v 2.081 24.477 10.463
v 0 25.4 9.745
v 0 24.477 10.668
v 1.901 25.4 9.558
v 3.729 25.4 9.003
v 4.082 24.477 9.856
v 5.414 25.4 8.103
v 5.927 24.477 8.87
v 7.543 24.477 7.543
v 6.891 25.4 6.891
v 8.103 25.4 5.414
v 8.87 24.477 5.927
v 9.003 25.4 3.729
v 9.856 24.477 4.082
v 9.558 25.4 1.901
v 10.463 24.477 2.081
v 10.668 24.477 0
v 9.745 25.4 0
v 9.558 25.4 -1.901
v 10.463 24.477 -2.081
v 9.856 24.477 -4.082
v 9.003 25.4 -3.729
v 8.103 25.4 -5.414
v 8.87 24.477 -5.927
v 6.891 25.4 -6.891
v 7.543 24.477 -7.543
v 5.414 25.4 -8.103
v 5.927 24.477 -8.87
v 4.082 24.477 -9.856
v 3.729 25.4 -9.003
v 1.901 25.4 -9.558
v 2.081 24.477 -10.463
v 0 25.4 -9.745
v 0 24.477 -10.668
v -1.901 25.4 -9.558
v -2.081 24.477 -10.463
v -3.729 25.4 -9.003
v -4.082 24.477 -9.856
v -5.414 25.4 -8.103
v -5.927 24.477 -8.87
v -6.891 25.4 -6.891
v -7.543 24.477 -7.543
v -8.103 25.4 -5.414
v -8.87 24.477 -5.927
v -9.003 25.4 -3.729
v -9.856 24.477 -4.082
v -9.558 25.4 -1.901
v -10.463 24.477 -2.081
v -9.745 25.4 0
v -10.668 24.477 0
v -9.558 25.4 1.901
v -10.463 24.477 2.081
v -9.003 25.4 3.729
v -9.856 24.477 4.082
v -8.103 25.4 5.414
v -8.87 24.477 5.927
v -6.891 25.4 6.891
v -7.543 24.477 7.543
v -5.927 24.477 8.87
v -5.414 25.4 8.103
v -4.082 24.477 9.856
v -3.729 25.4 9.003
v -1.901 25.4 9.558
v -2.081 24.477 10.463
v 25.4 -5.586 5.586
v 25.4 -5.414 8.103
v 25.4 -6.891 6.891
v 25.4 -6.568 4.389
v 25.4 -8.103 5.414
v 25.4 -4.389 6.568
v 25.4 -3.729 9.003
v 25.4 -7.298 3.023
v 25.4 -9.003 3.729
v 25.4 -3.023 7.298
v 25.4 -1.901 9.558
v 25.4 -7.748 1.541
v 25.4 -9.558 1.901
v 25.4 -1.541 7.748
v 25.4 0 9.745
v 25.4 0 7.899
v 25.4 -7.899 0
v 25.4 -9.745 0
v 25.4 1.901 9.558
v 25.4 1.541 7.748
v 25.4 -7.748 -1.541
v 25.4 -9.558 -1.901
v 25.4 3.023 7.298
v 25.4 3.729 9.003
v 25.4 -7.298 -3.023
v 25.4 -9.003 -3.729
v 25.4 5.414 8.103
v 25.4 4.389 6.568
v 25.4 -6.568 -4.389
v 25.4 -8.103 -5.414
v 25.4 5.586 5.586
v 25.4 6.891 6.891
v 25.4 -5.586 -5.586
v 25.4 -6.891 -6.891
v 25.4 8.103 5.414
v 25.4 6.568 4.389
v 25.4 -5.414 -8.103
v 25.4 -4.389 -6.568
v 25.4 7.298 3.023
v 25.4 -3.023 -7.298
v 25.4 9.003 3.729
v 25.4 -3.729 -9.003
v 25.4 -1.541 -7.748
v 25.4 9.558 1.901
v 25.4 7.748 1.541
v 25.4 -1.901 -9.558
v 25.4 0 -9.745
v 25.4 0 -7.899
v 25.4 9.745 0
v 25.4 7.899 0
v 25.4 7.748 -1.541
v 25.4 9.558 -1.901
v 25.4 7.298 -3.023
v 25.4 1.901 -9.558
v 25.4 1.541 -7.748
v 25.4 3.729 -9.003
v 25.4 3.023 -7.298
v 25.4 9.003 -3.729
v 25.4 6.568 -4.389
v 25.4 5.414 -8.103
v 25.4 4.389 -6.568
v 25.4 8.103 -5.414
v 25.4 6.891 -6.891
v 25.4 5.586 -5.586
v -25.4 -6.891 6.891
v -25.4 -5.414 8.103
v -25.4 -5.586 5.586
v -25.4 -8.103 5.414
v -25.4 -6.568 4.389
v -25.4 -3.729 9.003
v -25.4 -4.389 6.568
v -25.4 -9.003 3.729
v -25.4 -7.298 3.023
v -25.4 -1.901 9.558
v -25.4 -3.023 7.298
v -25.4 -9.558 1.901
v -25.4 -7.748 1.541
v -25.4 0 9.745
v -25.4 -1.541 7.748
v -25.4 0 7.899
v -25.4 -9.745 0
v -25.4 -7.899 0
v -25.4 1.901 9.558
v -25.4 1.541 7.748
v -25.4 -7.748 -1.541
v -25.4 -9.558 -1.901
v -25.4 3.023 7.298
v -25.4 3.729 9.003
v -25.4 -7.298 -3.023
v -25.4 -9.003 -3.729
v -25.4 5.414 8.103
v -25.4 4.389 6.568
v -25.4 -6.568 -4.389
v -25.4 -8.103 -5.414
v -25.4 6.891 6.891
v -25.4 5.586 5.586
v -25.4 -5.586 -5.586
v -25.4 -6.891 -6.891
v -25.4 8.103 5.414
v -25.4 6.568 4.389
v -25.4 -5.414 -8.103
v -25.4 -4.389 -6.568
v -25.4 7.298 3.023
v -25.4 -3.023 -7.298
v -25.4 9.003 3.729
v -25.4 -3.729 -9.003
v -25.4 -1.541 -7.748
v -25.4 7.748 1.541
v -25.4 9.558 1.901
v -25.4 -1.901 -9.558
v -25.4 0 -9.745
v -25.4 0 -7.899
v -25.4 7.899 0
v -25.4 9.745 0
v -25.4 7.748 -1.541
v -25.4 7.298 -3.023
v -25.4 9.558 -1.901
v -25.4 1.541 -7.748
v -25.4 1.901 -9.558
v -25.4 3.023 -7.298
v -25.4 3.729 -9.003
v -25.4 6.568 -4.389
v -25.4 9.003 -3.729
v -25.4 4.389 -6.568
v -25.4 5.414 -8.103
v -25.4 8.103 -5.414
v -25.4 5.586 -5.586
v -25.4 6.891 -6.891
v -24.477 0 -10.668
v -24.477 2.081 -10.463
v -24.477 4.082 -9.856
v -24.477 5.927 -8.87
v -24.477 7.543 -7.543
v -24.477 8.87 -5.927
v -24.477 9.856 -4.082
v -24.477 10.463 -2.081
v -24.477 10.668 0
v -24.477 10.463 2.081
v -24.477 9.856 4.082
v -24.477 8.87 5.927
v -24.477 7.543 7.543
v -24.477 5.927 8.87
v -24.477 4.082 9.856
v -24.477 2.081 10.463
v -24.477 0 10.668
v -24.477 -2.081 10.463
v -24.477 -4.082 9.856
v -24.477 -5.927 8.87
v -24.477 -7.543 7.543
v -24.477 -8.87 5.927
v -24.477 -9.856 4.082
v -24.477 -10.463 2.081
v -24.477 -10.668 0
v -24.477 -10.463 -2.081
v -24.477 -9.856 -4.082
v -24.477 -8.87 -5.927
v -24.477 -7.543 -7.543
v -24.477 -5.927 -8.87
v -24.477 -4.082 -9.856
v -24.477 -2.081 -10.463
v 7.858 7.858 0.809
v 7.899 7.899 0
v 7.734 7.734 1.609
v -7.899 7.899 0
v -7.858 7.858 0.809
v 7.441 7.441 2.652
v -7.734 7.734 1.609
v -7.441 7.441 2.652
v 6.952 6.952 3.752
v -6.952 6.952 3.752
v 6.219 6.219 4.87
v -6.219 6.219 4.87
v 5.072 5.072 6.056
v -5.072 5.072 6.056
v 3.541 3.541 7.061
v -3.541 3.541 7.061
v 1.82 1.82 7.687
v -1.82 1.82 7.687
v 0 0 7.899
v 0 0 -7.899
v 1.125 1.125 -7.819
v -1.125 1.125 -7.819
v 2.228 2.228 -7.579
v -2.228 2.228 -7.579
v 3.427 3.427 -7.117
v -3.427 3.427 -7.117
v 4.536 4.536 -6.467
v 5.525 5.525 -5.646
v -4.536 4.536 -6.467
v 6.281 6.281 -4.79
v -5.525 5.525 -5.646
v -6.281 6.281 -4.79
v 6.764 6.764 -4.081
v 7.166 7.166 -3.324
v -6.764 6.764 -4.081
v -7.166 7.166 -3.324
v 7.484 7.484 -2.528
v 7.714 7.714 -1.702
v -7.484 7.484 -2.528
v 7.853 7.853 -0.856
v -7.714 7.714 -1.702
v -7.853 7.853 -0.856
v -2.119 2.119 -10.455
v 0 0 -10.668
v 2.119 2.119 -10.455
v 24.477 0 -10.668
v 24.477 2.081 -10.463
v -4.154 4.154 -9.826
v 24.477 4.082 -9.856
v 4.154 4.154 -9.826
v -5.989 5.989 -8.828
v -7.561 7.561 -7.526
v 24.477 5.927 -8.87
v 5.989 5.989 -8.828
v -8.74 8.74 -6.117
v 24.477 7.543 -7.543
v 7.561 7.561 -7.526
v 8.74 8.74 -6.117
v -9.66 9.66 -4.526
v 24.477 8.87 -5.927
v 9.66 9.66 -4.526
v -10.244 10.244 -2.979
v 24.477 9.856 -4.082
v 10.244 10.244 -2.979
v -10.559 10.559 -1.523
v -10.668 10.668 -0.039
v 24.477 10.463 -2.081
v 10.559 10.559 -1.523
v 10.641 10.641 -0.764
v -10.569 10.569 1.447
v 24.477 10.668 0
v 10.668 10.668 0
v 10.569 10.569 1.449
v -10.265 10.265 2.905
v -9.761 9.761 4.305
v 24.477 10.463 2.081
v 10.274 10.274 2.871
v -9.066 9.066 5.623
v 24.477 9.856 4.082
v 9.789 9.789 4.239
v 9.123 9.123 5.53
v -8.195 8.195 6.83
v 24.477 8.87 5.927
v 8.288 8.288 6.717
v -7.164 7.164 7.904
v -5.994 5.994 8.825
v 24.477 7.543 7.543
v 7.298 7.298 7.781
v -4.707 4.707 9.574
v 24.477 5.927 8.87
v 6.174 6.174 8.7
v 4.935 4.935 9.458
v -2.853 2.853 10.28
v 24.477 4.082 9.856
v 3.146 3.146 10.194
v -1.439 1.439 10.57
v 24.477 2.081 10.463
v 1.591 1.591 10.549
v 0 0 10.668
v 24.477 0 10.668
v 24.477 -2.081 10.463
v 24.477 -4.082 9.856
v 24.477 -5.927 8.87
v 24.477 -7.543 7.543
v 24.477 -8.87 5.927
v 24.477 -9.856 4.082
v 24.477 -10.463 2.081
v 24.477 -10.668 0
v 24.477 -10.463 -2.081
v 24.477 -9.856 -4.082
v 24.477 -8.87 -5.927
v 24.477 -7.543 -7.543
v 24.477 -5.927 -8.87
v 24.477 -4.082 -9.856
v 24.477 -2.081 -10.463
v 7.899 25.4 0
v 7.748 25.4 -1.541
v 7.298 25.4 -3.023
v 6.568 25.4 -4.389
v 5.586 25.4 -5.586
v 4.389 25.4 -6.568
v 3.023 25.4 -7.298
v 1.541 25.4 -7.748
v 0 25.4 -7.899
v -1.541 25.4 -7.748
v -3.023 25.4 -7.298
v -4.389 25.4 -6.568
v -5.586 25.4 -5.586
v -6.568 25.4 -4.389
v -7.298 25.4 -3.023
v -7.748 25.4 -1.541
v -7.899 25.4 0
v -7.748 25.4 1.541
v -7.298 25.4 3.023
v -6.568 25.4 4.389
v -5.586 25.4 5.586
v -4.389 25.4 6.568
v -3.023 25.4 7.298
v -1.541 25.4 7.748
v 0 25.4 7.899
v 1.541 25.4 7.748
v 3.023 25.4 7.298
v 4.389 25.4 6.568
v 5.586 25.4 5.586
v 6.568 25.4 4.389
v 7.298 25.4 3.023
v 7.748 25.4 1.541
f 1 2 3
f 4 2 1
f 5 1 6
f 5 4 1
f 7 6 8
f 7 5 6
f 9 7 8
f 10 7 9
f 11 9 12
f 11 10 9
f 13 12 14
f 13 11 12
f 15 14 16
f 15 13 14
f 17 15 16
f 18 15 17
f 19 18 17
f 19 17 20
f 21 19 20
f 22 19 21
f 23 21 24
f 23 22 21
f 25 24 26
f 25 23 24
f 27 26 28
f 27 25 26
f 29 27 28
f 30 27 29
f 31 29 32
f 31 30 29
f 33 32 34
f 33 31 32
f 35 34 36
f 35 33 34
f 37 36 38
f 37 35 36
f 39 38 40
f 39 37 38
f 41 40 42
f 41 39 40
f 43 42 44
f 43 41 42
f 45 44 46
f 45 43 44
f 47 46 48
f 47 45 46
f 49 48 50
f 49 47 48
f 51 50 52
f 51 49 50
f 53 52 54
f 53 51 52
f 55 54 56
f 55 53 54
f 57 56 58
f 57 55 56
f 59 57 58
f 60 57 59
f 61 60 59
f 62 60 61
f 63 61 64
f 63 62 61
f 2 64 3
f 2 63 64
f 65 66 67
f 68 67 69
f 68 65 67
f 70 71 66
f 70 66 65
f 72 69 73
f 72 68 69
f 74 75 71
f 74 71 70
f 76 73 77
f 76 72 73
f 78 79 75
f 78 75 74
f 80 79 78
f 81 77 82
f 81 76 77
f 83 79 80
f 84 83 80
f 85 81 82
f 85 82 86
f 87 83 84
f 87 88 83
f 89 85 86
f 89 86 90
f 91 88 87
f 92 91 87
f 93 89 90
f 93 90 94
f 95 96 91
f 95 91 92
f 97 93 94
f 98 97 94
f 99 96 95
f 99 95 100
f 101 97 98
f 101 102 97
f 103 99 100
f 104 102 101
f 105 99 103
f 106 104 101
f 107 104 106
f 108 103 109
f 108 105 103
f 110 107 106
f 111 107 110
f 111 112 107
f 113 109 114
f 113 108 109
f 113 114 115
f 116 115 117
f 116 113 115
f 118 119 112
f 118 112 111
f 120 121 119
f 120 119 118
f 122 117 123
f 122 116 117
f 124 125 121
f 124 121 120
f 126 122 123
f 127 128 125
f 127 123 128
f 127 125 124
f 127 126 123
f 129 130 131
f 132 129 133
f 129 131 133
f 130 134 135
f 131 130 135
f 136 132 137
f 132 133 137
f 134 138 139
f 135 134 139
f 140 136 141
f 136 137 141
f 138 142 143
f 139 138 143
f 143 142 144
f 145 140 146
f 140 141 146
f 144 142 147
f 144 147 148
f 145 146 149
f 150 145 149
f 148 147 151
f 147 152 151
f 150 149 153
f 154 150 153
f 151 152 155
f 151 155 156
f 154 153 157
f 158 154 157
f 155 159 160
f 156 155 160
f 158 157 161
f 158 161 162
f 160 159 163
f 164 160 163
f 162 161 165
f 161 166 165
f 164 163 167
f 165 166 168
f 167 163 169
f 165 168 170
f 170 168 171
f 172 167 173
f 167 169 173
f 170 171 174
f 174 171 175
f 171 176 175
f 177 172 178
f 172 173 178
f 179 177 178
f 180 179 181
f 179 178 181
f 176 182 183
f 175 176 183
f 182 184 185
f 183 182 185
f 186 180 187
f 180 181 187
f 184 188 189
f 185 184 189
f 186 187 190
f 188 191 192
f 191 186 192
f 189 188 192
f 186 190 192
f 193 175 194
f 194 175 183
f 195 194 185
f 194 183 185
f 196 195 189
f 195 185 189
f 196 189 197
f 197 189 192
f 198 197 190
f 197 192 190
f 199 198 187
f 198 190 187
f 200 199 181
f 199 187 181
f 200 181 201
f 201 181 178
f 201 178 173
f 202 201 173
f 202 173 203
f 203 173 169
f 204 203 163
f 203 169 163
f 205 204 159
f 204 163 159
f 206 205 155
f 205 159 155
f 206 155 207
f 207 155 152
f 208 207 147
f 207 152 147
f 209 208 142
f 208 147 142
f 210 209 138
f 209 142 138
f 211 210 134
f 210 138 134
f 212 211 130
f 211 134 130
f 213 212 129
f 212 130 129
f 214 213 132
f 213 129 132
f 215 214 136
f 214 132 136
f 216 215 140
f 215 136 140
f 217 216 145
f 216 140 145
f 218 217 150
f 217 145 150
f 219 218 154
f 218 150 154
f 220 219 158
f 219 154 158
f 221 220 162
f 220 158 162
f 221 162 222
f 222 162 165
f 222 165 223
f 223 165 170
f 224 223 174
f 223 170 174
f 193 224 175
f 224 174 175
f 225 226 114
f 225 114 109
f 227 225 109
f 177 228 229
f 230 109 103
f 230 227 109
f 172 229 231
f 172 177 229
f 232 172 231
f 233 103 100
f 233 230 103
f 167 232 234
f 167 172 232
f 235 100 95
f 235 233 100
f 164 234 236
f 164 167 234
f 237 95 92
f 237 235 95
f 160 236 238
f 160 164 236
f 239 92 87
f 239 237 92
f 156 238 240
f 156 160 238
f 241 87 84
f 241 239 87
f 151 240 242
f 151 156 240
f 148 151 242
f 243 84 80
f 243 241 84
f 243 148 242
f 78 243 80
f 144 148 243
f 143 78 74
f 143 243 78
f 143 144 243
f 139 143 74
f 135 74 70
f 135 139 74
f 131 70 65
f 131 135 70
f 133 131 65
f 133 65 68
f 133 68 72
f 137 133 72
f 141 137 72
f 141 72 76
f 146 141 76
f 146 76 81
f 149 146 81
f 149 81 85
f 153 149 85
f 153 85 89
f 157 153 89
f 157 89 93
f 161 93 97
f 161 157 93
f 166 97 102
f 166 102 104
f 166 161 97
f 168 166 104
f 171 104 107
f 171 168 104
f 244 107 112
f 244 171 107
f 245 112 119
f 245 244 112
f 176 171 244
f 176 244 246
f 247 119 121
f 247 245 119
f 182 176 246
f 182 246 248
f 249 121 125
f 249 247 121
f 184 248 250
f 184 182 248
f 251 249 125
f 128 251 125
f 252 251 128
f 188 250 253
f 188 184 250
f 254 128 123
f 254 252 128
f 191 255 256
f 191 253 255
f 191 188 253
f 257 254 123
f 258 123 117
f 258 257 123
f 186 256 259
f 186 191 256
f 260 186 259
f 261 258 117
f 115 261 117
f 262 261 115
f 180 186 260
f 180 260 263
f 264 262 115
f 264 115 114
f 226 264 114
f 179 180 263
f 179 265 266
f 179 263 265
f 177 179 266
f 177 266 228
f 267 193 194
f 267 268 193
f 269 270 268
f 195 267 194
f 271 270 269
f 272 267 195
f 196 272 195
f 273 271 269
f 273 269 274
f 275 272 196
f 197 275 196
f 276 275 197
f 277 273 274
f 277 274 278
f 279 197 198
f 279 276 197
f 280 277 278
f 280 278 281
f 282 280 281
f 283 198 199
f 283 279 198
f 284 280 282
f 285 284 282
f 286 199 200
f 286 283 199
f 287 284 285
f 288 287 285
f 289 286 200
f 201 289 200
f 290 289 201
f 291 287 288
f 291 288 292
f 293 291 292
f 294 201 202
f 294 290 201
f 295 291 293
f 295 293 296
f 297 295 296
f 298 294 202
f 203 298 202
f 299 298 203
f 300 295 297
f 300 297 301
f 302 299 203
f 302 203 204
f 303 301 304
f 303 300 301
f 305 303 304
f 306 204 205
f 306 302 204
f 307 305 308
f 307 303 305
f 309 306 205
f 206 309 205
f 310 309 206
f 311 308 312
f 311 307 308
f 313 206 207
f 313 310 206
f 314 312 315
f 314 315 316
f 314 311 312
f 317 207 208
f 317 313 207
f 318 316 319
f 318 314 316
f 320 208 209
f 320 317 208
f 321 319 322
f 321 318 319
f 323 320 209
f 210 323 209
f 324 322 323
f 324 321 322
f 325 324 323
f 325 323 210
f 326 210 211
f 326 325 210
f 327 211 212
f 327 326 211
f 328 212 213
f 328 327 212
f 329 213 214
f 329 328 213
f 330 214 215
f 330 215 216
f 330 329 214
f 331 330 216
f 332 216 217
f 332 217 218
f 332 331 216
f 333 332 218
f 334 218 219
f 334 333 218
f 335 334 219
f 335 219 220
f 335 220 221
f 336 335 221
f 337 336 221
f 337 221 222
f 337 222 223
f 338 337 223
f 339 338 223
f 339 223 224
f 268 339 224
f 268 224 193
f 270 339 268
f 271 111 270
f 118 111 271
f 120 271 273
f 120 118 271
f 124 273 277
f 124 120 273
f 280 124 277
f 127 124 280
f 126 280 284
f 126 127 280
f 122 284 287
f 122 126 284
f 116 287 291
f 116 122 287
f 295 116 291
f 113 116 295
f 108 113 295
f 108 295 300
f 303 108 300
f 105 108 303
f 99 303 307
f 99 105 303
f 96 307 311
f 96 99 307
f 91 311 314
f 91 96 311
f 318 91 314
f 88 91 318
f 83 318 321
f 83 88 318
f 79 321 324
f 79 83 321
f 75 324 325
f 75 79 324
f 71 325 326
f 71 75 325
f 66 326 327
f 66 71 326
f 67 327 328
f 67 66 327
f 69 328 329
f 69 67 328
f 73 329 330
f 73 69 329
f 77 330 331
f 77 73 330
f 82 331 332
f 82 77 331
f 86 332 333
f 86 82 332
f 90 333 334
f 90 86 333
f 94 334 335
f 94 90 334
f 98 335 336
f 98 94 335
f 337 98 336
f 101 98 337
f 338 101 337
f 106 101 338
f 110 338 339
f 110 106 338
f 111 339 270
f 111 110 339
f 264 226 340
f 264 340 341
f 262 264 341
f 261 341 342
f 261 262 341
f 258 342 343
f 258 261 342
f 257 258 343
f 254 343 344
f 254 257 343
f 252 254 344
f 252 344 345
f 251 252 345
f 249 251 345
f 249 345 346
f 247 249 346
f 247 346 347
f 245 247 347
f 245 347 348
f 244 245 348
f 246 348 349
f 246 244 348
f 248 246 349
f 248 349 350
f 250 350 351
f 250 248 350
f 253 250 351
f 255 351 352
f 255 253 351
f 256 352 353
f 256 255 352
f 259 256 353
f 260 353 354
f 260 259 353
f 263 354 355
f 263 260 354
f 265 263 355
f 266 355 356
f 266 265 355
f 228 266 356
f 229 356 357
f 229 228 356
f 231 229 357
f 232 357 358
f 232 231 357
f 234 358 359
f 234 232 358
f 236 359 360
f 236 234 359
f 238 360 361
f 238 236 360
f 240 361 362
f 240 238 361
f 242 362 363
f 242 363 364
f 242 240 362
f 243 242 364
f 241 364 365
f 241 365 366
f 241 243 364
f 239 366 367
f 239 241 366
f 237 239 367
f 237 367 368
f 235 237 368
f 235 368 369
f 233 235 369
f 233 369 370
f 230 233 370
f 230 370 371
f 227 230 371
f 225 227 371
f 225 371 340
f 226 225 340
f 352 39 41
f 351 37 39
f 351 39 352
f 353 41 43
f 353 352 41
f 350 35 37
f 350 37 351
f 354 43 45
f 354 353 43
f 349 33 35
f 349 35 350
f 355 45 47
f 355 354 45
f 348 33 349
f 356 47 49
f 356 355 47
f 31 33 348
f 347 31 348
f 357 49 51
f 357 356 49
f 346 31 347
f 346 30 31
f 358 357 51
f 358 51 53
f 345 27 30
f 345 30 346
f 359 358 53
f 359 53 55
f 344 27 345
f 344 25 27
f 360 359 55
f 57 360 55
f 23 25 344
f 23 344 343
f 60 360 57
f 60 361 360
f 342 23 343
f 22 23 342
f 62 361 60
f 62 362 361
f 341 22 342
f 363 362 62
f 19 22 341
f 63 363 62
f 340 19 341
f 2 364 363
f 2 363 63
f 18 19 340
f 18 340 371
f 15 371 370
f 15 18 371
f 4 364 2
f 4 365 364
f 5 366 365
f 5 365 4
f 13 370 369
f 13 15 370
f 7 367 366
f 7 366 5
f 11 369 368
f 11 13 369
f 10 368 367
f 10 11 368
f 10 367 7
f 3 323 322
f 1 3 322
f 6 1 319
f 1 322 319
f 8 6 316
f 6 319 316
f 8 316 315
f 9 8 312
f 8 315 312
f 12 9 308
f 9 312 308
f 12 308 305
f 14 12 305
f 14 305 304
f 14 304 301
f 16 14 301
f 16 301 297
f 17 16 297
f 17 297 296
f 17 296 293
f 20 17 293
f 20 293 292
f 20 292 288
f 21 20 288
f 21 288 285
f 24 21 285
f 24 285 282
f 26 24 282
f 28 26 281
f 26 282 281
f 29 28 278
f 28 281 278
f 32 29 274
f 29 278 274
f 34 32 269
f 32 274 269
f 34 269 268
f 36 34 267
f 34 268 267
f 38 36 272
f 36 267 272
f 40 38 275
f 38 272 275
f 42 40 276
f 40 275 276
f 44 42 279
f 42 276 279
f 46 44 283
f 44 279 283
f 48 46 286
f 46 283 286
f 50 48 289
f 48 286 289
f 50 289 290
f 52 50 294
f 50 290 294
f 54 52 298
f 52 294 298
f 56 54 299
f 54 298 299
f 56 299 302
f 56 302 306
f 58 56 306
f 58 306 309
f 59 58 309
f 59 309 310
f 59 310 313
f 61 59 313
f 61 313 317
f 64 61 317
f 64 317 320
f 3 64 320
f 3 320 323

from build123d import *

# Parameters (mm, degrees)
RUNROUTE_R           = 10.668
RUNEXTRUDE_DEPTH     = 25.4
OUTLETROUTE_R        = 10.668
OUTLETEXTRUDE_DEPTH  = 25.4
TEESHELL_START       = -25.4
TEESHELL_OUTLINE_R   = 7.8994
TEESHELL_DEPTH       = 50.8
TEESHELL_START_2     = -1e-07
TEESHELL_2_OUTLINE_R = 7.8994
TEESHELL_2_DEPTH     = 25.4000001
TEECHAMFER_SIZE      = 0.922866667


with BuildPart() as part:
    # RunRoute → RunExtrude (new body)
    with BuildSketch(Plane(origin=(0, 0, 0), x_dir=(0, 0, -1), z_dir=(1, 0, 0))):
        Circle(RUNROUTE_R)
    runextrude = extrude(amount=RUNEXTRUDE_DEPTH)

    # RunExtrudeMirror: RunExtrude across plane
    add(runextrude.mirror(Plane(origin=(0, 0, 0), x_dir=(0, 0, 1), z_dir=(1, 0, 0))))

    # OutletRoute → OutletExtrude (add)
    with BuildSketch(Plane(origin=(0, 0, 0), x_dir=(1, 0, 0), z_dir=(0, 1, 0))):
        with Locations(Location((0, 0, 0), (0, 0, 270))):
            Circle(OUTLETROUTE_R)
    extrude(amount=OUTLETEXTRUDE_DEPTH)

    # TeeShell: read off the stored shape, not the designer's step
    # TeeShell outline → TeeShell (cut)
    with BuildSketch(Plane.YZ.offset(TEESHELL_START)):
        Circle(TEESHELL_OUTLINE_R)
    extrude(amount=TEESHELL_DEPTH, mode=Mode.SUBTRACT)

    # TeeShell 2 outline → TeeShell 2 (cut)
    with BuildSketch(Plane(origin=(0, 0, 0), x_dir=(1, 0, 0), z_dir=(0, 1, 0)).offset(TEESHELL_START_2)):
        Circle(TEESHELL_2_OUTLINE_R)
    extrude(amount=TEESHELL_2_DEPTH, mode=Mode.SUBTRACT)

    # TeeChamfer
    # the kernel refuses this chamfer: 0.922866667 mm, written as the material it takes off along each edge
    with BuildSketch(Plane(origin=(25.4, 0, 0), x_dir=(0, 0, -1), z_dir=(0, -1, 0))) as teechamfer_piece_1:
        Polygon((10.668, -TEECHAMFER_SIZE), (10.668 - TEECHAMFER_SIZE, 0), (10.668, 0), align=None)
    revolve(axis=Axis((25.4, 0, 0), (1, 0, 0)), mode=Mode.SUBTRACT)
    with BuildSketch(Plane(origin=(-25.4, 0, 0), x_dir=(0, 0, -1), z_dir=(0, -1, 0))) as teechamfer_piece_2:
        Polygon((10.668, TEECHAMFER_SIZE), (10.668 - TEECHAMFER_SIZE, 0), (10.668, 0), align=None)
    revolve(axis=Axis((-25.4, 0, 0), (1, 0, 0)), mode=Mode.SUBTRACT)
    with BuildSketch(Plane(origin=(0, 25.4, 0), x_dir=(0, 0, 1), z_dir=(-1, 0, 0))) as teechamfer_piece_3:
        Polygon((10.668, -TEECHAMFER_SIZE), (10.668 - TEECHAMFER_SIZE, 0), (10.668, 0), align=None)
    revolve(axis=Axis((0, 25.4, 0), (0, 1, 0)), mode=Mode.SUBTRACT)


solid = part.part
